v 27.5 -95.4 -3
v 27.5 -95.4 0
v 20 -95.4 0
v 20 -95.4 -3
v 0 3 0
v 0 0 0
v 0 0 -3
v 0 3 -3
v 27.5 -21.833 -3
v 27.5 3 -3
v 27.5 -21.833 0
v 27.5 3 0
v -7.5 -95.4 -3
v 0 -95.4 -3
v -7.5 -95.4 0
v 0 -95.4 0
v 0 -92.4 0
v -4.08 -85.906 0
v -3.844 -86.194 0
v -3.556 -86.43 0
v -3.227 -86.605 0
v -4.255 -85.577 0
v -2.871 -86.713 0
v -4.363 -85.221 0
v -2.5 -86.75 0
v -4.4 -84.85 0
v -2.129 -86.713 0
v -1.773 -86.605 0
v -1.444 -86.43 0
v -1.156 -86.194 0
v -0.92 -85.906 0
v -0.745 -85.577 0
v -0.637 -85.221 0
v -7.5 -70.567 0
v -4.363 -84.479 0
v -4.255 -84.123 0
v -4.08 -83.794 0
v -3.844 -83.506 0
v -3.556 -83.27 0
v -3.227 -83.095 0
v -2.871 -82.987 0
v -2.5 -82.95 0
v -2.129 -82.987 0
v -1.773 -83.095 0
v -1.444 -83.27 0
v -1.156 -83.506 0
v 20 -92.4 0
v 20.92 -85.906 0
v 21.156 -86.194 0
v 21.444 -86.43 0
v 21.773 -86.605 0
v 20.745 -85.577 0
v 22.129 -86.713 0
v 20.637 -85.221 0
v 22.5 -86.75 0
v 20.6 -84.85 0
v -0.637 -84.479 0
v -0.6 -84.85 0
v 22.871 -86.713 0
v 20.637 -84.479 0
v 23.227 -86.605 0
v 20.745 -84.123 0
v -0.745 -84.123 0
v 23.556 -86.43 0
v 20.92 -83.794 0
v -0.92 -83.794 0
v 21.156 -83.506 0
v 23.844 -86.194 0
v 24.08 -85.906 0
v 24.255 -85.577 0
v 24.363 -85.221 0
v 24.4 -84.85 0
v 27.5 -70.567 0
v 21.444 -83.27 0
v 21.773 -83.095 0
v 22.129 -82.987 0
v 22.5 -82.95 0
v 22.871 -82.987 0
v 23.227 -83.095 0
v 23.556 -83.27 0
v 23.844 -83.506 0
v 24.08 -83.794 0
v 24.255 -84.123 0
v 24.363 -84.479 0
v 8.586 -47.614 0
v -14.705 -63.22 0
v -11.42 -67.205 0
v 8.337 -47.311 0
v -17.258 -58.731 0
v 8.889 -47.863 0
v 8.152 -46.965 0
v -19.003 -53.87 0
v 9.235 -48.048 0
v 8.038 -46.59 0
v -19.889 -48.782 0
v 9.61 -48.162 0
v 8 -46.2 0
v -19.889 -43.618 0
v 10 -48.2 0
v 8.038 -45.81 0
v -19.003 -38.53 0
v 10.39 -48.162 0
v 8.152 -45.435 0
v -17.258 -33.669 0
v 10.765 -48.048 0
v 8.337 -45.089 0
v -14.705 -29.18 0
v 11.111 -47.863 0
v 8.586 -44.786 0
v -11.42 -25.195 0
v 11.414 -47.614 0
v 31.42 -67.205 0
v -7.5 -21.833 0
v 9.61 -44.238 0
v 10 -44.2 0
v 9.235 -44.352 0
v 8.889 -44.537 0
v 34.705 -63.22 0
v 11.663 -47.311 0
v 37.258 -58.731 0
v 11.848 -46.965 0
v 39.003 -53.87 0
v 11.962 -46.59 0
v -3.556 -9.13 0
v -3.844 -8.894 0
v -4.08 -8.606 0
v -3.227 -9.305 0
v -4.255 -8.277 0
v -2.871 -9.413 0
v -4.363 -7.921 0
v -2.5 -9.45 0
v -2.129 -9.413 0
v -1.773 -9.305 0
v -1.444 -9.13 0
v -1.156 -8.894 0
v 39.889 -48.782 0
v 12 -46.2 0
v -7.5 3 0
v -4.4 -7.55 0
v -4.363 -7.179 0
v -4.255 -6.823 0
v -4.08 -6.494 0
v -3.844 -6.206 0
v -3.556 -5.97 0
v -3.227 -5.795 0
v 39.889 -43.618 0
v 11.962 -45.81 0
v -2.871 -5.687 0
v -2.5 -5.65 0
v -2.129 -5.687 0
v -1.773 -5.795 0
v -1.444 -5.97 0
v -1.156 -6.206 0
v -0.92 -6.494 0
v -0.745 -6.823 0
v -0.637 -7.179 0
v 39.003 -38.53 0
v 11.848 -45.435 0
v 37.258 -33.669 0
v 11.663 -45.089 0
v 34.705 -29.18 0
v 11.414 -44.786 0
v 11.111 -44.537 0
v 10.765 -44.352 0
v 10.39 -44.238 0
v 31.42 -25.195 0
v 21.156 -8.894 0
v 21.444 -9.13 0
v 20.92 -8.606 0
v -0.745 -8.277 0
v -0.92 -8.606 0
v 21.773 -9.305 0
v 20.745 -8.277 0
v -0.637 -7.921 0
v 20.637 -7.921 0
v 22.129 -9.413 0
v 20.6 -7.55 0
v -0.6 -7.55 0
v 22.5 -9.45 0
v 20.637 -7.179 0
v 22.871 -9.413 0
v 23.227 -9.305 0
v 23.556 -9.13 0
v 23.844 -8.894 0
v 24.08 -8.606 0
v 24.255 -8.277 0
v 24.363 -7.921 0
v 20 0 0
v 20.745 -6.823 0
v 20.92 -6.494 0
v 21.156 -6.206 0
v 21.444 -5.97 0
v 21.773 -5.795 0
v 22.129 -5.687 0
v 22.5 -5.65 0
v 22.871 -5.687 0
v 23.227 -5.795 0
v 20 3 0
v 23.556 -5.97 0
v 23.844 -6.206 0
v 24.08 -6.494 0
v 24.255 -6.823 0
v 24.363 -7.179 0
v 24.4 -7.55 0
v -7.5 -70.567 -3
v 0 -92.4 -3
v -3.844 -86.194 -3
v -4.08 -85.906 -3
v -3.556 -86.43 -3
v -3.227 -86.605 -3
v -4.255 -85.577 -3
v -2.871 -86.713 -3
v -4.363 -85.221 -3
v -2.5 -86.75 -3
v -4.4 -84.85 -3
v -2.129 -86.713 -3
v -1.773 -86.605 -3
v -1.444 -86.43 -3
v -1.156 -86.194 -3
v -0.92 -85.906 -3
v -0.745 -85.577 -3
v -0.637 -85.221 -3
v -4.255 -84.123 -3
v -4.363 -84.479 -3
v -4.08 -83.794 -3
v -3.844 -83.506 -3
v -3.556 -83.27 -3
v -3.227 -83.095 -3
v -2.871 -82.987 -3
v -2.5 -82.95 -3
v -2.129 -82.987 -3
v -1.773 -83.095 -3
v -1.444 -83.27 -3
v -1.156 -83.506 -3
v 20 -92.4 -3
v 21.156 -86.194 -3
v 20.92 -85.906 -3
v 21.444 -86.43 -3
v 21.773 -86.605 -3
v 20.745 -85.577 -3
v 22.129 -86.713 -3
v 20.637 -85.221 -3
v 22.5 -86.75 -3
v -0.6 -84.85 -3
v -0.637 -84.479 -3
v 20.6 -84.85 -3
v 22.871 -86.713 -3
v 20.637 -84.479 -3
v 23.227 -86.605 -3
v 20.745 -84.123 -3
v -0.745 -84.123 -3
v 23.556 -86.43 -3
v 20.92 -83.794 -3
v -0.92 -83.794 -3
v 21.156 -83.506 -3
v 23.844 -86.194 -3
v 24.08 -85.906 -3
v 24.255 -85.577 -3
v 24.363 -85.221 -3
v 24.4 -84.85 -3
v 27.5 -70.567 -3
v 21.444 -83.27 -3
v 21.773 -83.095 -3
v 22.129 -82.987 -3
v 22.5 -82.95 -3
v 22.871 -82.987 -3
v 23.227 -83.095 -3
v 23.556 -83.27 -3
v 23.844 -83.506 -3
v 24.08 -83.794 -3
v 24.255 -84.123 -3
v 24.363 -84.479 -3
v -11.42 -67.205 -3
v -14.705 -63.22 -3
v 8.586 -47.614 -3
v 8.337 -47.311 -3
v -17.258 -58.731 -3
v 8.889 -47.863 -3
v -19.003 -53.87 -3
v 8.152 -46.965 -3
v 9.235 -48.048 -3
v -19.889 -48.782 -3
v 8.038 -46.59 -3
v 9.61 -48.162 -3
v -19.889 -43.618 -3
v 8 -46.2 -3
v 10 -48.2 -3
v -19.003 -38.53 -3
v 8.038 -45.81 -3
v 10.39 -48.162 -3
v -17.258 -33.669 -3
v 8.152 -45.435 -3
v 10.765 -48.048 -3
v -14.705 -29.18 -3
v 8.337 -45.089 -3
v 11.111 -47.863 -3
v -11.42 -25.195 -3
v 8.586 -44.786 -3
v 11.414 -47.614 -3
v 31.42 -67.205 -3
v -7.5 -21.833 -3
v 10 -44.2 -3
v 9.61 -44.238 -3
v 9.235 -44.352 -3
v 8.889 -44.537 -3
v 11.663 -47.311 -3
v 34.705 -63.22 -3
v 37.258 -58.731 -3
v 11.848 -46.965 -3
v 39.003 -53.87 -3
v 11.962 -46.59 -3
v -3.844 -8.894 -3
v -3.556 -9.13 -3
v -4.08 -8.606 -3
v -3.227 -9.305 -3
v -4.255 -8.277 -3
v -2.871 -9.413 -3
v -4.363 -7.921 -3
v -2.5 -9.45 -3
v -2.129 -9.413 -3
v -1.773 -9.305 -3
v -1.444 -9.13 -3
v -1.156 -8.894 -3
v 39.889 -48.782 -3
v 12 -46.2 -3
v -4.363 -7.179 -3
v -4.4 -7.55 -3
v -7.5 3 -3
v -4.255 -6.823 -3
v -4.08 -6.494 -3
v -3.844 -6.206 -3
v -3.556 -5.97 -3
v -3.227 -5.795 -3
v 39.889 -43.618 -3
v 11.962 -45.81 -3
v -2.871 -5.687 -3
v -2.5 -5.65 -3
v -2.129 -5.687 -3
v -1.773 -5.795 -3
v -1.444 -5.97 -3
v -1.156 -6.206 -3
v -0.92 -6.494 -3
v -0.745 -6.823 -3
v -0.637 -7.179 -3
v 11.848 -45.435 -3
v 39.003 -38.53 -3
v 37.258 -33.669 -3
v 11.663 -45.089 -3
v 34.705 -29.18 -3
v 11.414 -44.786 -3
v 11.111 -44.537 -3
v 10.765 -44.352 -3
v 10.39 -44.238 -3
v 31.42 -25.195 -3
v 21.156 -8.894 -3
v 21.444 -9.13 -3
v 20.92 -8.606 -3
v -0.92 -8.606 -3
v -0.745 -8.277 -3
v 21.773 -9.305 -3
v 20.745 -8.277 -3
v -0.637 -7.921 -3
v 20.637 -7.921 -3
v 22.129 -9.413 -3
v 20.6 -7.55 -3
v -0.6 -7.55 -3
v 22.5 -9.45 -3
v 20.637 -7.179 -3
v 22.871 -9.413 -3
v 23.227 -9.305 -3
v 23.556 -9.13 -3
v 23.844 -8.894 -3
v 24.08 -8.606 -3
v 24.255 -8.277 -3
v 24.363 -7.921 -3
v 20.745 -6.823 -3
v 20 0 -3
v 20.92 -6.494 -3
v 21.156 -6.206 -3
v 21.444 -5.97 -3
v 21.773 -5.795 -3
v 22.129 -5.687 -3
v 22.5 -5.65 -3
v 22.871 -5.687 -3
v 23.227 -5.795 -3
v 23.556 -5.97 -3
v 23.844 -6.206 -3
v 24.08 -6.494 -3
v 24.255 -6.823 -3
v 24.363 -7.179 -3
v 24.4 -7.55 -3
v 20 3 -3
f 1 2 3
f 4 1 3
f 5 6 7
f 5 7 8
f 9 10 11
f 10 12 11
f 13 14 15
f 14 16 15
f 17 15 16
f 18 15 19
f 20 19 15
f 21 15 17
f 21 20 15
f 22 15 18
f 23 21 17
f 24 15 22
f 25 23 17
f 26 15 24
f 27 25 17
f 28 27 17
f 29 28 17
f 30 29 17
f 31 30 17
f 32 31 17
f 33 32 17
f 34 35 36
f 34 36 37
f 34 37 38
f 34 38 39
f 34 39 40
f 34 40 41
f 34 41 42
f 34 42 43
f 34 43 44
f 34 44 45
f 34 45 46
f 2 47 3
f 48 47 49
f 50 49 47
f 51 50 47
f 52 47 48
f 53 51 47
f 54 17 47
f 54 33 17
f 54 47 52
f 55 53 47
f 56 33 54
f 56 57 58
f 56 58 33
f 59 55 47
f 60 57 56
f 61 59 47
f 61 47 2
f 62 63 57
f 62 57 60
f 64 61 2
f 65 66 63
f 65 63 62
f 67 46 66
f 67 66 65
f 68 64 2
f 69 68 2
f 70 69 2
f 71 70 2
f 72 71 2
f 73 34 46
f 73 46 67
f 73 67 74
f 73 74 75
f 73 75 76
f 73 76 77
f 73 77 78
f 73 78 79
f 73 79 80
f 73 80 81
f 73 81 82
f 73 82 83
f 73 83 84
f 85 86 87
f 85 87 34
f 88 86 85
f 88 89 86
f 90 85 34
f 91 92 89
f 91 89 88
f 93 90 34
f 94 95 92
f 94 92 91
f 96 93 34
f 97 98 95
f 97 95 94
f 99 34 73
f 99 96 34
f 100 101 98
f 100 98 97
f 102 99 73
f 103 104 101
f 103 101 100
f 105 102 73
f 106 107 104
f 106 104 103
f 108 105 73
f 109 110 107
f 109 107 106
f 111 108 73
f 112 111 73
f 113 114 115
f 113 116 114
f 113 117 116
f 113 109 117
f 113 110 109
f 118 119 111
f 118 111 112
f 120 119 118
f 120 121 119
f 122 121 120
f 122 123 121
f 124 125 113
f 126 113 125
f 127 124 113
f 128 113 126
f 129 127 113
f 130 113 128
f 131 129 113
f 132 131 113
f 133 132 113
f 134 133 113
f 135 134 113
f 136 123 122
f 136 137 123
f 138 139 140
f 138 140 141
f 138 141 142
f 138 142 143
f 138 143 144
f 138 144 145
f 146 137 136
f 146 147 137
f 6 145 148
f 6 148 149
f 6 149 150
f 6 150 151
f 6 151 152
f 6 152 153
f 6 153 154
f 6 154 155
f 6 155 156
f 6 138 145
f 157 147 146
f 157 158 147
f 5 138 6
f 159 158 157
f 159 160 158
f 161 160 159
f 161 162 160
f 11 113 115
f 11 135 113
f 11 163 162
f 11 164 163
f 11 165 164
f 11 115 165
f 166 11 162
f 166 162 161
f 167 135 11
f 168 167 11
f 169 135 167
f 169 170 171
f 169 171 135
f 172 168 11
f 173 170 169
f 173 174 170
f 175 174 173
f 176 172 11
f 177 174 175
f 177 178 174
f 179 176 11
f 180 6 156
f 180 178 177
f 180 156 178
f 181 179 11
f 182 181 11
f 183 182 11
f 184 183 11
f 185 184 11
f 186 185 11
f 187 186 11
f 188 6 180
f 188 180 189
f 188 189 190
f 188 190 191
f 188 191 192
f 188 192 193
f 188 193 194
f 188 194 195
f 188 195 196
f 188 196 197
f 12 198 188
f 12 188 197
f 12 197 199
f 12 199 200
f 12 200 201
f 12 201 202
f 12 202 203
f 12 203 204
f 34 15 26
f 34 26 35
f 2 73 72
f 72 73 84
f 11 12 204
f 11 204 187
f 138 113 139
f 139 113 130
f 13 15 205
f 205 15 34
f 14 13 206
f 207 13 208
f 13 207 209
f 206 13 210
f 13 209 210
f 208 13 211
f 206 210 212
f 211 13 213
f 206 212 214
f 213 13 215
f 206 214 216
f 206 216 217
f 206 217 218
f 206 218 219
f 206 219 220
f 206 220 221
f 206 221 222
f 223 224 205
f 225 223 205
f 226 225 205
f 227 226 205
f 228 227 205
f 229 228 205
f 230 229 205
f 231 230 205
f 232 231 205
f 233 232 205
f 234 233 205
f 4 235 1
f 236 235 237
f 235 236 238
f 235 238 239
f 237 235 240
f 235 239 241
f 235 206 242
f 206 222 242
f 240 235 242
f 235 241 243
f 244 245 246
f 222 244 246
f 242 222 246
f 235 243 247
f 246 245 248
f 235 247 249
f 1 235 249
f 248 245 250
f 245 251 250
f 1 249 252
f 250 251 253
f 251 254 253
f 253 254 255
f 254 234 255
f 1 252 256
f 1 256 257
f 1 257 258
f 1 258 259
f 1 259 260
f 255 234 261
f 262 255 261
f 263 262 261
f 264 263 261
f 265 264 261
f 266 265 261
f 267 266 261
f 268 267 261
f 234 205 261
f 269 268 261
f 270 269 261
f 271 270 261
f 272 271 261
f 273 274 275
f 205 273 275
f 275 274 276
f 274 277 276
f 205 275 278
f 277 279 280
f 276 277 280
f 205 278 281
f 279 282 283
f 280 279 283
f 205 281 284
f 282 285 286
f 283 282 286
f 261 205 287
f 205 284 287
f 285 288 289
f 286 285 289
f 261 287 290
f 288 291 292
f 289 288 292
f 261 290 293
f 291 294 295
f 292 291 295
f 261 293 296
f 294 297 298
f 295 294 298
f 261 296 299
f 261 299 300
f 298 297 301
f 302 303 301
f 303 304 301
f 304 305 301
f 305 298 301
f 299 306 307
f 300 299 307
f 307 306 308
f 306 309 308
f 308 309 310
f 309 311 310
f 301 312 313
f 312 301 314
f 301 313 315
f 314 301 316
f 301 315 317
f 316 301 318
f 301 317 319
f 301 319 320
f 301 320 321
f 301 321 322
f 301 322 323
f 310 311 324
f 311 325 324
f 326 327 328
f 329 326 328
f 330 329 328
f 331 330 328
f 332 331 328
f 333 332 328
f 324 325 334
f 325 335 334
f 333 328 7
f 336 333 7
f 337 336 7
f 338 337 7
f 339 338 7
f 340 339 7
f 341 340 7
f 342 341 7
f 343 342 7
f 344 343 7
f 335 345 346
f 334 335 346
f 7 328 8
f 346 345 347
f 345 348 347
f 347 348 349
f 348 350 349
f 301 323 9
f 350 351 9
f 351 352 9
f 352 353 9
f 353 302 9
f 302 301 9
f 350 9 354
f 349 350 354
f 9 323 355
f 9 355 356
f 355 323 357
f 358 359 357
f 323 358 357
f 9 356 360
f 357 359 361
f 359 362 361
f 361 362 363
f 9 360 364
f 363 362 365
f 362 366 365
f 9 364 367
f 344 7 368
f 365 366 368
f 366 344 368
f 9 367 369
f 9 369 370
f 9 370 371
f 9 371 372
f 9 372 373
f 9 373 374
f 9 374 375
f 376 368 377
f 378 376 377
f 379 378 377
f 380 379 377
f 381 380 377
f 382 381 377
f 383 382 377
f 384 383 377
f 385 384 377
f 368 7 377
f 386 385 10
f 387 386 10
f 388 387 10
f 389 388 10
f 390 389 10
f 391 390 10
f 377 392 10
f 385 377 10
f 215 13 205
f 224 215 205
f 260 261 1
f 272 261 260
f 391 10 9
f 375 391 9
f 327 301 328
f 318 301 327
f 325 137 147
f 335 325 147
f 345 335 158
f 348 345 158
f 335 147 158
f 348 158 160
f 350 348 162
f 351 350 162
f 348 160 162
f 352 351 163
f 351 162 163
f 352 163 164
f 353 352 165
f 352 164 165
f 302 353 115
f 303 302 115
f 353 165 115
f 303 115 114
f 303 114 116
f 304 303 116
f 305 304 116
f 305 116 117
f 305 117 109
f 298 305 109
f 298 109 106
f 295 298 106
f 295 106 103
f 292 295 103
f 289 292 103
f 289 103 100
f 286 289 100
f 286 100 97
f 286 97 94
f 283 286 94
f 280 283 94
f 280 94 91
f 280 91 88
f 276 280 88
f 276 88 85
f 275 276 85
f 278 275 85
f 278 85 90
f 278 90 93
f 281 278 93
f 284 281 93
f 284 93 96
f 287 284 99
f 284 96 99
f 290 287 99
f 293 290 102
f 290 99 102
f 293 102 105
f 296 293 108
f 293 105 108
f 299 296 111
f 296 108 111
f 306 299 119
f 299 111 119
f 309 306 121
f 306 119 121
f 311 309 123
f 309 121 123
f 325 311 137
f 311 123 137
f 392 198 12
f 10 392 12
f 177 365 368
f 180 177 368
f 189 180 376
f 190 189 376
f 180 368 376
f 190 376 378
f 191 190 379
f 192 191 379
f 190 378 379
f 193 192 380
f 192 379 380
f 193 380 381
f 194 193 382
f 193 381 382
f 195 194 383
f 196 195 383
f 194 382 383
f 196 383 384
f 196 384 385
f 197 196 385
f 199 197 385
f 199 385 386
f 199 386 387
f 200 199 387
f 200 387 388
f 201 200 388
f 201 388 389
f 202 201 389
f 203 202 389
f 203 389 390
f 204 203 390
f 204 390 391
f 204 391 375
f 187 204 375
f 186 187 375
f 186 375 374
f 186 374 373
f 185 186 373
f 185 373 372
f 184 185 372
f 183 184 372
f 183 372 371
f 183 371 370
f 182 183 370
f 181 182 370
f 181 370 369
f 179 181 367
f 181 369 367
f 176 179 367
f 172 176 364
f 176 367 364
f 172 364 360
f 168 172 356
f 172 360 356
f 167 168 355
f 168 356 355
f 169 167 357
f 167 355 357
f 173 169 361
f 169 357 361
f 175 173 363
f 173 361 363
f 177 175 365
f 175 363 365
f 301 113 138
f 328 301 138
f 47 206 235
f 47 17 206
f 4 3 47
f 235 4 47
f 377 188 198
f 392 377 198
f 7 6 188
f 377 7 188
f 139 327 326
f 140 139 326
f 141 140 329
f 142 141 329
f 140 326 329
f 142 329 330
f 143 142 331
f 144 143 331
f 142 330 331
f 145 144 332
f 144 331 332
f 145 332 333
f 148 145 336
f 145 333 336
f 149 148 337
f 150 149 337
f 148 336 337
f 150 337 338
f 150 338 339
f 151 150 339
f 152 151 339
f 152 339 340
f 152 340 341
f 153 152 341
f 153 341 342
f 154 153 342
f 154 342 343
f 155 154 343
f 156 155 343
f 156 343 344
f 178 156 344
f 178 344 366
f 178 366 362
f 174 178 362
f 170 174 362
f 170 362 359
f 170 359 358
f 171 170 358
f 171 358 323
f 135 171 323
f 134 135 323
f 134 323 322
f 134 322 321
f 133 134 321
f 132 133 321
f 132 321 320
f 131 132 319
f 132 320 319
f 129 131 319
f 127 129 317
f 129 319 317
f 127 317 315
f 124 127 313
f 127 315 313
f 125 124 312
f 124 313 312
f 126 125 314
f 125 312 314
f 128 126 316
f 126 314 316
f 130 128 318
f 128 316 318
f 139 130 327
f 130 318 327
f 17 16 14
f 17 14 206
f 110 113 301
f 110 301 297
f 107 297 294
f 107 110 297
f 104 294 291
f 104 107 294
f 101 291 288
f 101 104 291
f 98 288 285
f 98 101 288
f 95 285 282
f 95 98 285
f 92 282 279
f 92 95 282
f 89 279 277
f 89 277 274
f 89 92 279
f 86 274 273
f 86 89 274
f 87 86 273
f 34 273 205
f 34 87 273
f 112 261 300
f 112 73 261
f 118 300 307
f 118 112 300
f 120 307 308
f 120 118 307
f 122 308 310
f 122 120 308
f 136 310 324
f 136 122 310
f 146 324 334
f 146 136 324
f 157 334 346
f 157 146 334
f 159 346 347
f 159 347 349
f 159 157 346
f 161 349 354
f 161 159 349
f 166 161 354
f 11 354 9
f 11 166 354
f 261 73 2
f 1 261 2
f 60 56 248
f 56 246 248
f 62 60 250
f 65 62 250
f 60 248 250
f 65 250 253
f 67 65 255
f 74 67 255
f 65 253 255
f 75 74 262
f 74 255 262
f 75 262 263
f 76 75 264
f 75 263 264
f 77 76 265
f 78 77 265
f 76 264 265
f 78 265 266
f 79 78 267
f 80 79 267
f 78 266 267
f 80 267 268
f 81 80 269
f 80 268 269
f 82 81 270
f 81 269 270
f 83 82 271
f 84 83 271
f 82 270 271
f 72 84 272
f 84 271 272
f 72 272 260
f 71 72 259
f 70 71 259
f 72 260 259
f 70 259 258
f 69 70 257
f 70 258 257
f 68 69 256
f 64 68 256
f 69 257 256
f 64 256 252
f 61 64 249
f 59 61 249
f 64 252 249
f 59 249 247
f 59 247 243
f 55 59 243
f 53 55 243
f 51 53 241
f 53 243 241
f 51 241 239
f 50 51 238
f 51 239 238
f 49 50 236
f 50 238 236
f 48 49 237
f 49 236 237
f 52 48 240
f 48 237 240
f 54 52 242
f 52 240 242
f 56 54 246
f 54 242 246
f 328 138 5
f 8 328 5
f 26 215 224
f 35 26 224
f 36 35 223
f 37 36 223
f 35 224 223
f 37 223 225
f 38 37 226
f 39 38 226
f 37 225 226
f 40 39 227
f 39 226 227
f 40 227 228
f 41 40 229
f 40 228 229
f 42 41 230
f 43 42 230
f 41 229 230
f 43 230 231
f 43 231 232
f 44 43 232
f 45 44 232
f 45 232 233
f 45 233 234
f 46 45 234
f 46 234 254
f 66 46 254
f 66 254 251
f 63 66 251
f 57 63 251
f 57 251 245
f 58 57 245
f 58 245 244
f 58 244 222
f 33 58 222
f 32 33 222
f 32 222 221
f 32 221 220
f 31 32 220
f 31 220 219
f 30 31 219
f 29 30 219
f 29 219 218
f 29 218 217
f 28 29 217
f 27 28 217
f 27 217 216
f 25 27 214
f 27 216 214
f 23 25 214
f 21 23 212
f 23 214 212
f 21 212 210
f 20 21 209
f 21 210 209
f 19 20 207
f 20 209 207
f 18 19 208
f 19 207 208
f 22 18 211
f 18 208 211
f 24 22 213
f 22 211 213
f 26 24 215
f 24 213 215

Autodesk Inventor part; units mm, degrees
ref_plane "YZ Plane" through (0, 0, 0) normal (1, 0, 0) x (0, 1, 0)
ref_plane "XZ Plane" through (0, 0, 0) normal (0, 1, 0) x (-1, 0, 0)
ref_plane "XY Plane" through (0, 0, 0) normal (0, 0, 1) x (1, 0, 0)
sketch "Sketch1" plane through (0, 0, 0) normal (0, 0, 1) x (1, 0, 0)
  line L0 (0, 0) -> (20, 0) projected
  line L1 (20, 0) -> (20, 3) projected
  line L2 (0, 3) -> (20, 3) projected
  line L3 (0, 0) -> (0, 3) projected
  line L4 (0, -95.4) -> (20, -95.4) projected
  line L5 (20, -95.4) -> (20, -92.4) projected
  line L6 (0, -92.4) -> (20, -92.4) projected
  line L7 (0, -95.4) -> (0, -92.4) projected
  line L8 (-7.5, 3) -> (0, 3) construction
  line L9 (20, 3) -> (27.5, 3) construction
  line L10 (20, -95.4) -> (27.5, -95.4) construction
  line L11 (-7.5, -95.4) -> (0, -95.4) construction
  line L12 (-7.5, 3) -> (27.5, 3)
  line L13 (27.5, -95.4) -> (-7.5, -95.4)
  line L14 (-7.5, 3) -> (27.5, -95.4) construction
  line L15 (27.5, 3) -> (-7.5, -95.4) construction
  line L16 (-7.5, -95.4) -> (-7.5, -70.567)
  line L17 (-7.5, -21.833) -> (-7.5, 3)
  line L18 (27.5, 3) -> (27.5, -21.833)
  line L19 (27.5, -70.567) -> (27.5, -95.4)
  arc A0 (27.5, -70.567) -> (27.5, -21.833) centre (10, -46.2) ccw
  arc A1 (-7.5, -21.833) -> (-7.5, -70.567) centre (10, -46.2) ccw
  dimension "d1" = 35
  dimension "d2" = 35
extrude "Extrusion1" add sketch "Sketch1" against normal blind 3 contours L0 L1 L12 L18 A0 L19 L13 L5 L6 L7 L16 A1 L17 L3
sketch "Sketch2" plane through (0, 0, -3) normal (0, 0, -1) x (-1, 0, 0)
  arc A0 (0.6, -86.2) -> (4.4, -86.2) centre (2.5, -86.2) ccw construction
  line L0 (0.6, -86.2) -> (0.6, -83.5) construction
  arc A1 (4.4, -83.5) -> (0.6, -83.5) centre (2.5, -83.5) ccw construction
  line L1 (4.4, -83.5) -> (4.4, -86.2) construction
  arc A2 (-1.5, -77.8) -> (-2.5, -78.8) centre (-1.5, -78.8) ccw construction
  line L2 (-2.5, -78.8) -> (-2.5, -91.4) construction
  line L3 (-2.5, -91.4) -> (7.5, -91.4) construction
  line L4 (7.5, -91.4) -> (7.5, -78.8) construction
  arc A3 (7.5, -78.8) -> (6.5, -77.8) centre (6.5, -78.8) ccw construction
  line L5 (6.5, -77.8) -> (-1.5, -77.8) construction
  arc A4 (-24.4, -86.2) -> (-20.6, -86.2) centre (-22.5, -86.2) ccw construction
  line L6 (-24.4, -86.2) -> (-24.4, -83.5) construction
  arc A5 (-20.6, -83.5) -> (-24.4, -83.5) centre (-22.5, -83.5) ccw construction
  line L7 (-20.6, -83.5) -> (-20.6, -86.2) construction
  arc A6 (-26.5, -77.8) -> (-27.5, -78.8) centre (-26.5, -78.8) ccw construction
  line L8 (-27.5, -78.8) -> (-27.5, -91.4) construction
  line L9 (-27.5, -91.4) -> (-17.5, -91.4) construction
  line L10 (-17.5, -91.4) -> (-17.5, -78.8) construction
  arc A7 (-17.5, -78.8) -> (-18.5, -77.8) centre (-18.5, -78.8) ccw construction
  line L11 (-18.5, -77.8) -> (-26.5, -77.8) construction
  arc A8 (4.4, -6.2) -> (0.6, -6.2) centre (2.5, -6.2) ccw construction
  line L12 (4.4, -6.2) -> (4.4, -8.9) construction
  arc A9 (0.6, -8.9) -> (4.4, -8.9) centre (2.5, -8.9) ccw construction
  line L13 (0.6, -8.9) -> (0.6, -6.2) construction
  arc A10 (6.5, -14.6) -> (7.5, -13.6) centre (6.5, -13.6) ccw construction
  line L14 (7.5, -13.6) -> (7.5, -1) construction
  line L15 (7.5, -1) -> (-2.5, -1) construction
  line L16 (-2.5, -1) -> (-2.5, -13.6) construction
  arc A11 (-2.5, -13.6) -> (-1.5, -14.6) centre (-1.5, -13.6) ccw construction
  line L17 (-1.5, -14.6) -> (6.5, -14.6) construction
  arc A12 (-20.6, -6.2) -> (-24.4, -6.2) centre (-22.5, -6.2) ccw construction
  line L18 (-20.6, -6.2) -> (-20.6, -8.9) construction
  arc A13 (-24.4, -8.9) -> (-20.6, -8.9) centre (-22.5, -8.9) ccw construction
  line L19 (-24.4, -8.9) -> (-24.4, -6.2) construction
  arc A14 (-18.5, -14.6) -> (-17.5, -13.6) centre (-18.5, -13.6) ccw construction
  line L20 (-17.5, -13.6) -> (-17.5, -1) construction
  line L21 (-17.5, -1) -> (-27.5, -1) construction
  line L22 (-27.5, -1) -> (-27.5, -13.6) construction
  arc A15 (-27.5, -13.6) -> (-26.5, -14.6) centre (-26.5, -13.6) ccw construction
  line L23 (-26.5, -14.6) -> (-18.5, -14.6) construction
  line L24 (-22.5, -86.2) -> (-22.5, -83.5) construction
  line L25 (2.5, -86.2) -> (2.5, -83.5) construction
  line L26 (2.5, -8.9) -> (2.5, -6.2) construction
  line L27 (-22.5, -8.9) -> (-22.5, -6.2) construction
  circle A16 centre (-22.5, -84.85) radius 1.9
  circle A17 centre (2.5, -84.85) radius 1.9
  circle A18 centre (2.5, -7.55) radius 1.9
  circle A19 centre (-22.5, -7.55) radius 1.9
  point P0 (0, 0)
extrude "Extrusion2" cut sketch "Sketch2" against normal blind 27.1625
sketch "Sketch3" plane through (0, 0, 0) normal (0, 0, 1) x (1, 0, 0)
  arc A0 (27.5, -70.567) -> (27.5, -21.833) centre (10, -46.2) ccw projected
  arc A1 (-7.5, -21.833) -> (-7.5, -70.567) centre (10, -46.2) ccw projected
  circle A2 centre (10, -46.2) radius 2
  point P0 (0, 0)
  dimension "d7" = 4
extrude "Extrusion3" cut sketch "Sketch3" against normal blind 14.4625
properties part number "Camera raiser"
